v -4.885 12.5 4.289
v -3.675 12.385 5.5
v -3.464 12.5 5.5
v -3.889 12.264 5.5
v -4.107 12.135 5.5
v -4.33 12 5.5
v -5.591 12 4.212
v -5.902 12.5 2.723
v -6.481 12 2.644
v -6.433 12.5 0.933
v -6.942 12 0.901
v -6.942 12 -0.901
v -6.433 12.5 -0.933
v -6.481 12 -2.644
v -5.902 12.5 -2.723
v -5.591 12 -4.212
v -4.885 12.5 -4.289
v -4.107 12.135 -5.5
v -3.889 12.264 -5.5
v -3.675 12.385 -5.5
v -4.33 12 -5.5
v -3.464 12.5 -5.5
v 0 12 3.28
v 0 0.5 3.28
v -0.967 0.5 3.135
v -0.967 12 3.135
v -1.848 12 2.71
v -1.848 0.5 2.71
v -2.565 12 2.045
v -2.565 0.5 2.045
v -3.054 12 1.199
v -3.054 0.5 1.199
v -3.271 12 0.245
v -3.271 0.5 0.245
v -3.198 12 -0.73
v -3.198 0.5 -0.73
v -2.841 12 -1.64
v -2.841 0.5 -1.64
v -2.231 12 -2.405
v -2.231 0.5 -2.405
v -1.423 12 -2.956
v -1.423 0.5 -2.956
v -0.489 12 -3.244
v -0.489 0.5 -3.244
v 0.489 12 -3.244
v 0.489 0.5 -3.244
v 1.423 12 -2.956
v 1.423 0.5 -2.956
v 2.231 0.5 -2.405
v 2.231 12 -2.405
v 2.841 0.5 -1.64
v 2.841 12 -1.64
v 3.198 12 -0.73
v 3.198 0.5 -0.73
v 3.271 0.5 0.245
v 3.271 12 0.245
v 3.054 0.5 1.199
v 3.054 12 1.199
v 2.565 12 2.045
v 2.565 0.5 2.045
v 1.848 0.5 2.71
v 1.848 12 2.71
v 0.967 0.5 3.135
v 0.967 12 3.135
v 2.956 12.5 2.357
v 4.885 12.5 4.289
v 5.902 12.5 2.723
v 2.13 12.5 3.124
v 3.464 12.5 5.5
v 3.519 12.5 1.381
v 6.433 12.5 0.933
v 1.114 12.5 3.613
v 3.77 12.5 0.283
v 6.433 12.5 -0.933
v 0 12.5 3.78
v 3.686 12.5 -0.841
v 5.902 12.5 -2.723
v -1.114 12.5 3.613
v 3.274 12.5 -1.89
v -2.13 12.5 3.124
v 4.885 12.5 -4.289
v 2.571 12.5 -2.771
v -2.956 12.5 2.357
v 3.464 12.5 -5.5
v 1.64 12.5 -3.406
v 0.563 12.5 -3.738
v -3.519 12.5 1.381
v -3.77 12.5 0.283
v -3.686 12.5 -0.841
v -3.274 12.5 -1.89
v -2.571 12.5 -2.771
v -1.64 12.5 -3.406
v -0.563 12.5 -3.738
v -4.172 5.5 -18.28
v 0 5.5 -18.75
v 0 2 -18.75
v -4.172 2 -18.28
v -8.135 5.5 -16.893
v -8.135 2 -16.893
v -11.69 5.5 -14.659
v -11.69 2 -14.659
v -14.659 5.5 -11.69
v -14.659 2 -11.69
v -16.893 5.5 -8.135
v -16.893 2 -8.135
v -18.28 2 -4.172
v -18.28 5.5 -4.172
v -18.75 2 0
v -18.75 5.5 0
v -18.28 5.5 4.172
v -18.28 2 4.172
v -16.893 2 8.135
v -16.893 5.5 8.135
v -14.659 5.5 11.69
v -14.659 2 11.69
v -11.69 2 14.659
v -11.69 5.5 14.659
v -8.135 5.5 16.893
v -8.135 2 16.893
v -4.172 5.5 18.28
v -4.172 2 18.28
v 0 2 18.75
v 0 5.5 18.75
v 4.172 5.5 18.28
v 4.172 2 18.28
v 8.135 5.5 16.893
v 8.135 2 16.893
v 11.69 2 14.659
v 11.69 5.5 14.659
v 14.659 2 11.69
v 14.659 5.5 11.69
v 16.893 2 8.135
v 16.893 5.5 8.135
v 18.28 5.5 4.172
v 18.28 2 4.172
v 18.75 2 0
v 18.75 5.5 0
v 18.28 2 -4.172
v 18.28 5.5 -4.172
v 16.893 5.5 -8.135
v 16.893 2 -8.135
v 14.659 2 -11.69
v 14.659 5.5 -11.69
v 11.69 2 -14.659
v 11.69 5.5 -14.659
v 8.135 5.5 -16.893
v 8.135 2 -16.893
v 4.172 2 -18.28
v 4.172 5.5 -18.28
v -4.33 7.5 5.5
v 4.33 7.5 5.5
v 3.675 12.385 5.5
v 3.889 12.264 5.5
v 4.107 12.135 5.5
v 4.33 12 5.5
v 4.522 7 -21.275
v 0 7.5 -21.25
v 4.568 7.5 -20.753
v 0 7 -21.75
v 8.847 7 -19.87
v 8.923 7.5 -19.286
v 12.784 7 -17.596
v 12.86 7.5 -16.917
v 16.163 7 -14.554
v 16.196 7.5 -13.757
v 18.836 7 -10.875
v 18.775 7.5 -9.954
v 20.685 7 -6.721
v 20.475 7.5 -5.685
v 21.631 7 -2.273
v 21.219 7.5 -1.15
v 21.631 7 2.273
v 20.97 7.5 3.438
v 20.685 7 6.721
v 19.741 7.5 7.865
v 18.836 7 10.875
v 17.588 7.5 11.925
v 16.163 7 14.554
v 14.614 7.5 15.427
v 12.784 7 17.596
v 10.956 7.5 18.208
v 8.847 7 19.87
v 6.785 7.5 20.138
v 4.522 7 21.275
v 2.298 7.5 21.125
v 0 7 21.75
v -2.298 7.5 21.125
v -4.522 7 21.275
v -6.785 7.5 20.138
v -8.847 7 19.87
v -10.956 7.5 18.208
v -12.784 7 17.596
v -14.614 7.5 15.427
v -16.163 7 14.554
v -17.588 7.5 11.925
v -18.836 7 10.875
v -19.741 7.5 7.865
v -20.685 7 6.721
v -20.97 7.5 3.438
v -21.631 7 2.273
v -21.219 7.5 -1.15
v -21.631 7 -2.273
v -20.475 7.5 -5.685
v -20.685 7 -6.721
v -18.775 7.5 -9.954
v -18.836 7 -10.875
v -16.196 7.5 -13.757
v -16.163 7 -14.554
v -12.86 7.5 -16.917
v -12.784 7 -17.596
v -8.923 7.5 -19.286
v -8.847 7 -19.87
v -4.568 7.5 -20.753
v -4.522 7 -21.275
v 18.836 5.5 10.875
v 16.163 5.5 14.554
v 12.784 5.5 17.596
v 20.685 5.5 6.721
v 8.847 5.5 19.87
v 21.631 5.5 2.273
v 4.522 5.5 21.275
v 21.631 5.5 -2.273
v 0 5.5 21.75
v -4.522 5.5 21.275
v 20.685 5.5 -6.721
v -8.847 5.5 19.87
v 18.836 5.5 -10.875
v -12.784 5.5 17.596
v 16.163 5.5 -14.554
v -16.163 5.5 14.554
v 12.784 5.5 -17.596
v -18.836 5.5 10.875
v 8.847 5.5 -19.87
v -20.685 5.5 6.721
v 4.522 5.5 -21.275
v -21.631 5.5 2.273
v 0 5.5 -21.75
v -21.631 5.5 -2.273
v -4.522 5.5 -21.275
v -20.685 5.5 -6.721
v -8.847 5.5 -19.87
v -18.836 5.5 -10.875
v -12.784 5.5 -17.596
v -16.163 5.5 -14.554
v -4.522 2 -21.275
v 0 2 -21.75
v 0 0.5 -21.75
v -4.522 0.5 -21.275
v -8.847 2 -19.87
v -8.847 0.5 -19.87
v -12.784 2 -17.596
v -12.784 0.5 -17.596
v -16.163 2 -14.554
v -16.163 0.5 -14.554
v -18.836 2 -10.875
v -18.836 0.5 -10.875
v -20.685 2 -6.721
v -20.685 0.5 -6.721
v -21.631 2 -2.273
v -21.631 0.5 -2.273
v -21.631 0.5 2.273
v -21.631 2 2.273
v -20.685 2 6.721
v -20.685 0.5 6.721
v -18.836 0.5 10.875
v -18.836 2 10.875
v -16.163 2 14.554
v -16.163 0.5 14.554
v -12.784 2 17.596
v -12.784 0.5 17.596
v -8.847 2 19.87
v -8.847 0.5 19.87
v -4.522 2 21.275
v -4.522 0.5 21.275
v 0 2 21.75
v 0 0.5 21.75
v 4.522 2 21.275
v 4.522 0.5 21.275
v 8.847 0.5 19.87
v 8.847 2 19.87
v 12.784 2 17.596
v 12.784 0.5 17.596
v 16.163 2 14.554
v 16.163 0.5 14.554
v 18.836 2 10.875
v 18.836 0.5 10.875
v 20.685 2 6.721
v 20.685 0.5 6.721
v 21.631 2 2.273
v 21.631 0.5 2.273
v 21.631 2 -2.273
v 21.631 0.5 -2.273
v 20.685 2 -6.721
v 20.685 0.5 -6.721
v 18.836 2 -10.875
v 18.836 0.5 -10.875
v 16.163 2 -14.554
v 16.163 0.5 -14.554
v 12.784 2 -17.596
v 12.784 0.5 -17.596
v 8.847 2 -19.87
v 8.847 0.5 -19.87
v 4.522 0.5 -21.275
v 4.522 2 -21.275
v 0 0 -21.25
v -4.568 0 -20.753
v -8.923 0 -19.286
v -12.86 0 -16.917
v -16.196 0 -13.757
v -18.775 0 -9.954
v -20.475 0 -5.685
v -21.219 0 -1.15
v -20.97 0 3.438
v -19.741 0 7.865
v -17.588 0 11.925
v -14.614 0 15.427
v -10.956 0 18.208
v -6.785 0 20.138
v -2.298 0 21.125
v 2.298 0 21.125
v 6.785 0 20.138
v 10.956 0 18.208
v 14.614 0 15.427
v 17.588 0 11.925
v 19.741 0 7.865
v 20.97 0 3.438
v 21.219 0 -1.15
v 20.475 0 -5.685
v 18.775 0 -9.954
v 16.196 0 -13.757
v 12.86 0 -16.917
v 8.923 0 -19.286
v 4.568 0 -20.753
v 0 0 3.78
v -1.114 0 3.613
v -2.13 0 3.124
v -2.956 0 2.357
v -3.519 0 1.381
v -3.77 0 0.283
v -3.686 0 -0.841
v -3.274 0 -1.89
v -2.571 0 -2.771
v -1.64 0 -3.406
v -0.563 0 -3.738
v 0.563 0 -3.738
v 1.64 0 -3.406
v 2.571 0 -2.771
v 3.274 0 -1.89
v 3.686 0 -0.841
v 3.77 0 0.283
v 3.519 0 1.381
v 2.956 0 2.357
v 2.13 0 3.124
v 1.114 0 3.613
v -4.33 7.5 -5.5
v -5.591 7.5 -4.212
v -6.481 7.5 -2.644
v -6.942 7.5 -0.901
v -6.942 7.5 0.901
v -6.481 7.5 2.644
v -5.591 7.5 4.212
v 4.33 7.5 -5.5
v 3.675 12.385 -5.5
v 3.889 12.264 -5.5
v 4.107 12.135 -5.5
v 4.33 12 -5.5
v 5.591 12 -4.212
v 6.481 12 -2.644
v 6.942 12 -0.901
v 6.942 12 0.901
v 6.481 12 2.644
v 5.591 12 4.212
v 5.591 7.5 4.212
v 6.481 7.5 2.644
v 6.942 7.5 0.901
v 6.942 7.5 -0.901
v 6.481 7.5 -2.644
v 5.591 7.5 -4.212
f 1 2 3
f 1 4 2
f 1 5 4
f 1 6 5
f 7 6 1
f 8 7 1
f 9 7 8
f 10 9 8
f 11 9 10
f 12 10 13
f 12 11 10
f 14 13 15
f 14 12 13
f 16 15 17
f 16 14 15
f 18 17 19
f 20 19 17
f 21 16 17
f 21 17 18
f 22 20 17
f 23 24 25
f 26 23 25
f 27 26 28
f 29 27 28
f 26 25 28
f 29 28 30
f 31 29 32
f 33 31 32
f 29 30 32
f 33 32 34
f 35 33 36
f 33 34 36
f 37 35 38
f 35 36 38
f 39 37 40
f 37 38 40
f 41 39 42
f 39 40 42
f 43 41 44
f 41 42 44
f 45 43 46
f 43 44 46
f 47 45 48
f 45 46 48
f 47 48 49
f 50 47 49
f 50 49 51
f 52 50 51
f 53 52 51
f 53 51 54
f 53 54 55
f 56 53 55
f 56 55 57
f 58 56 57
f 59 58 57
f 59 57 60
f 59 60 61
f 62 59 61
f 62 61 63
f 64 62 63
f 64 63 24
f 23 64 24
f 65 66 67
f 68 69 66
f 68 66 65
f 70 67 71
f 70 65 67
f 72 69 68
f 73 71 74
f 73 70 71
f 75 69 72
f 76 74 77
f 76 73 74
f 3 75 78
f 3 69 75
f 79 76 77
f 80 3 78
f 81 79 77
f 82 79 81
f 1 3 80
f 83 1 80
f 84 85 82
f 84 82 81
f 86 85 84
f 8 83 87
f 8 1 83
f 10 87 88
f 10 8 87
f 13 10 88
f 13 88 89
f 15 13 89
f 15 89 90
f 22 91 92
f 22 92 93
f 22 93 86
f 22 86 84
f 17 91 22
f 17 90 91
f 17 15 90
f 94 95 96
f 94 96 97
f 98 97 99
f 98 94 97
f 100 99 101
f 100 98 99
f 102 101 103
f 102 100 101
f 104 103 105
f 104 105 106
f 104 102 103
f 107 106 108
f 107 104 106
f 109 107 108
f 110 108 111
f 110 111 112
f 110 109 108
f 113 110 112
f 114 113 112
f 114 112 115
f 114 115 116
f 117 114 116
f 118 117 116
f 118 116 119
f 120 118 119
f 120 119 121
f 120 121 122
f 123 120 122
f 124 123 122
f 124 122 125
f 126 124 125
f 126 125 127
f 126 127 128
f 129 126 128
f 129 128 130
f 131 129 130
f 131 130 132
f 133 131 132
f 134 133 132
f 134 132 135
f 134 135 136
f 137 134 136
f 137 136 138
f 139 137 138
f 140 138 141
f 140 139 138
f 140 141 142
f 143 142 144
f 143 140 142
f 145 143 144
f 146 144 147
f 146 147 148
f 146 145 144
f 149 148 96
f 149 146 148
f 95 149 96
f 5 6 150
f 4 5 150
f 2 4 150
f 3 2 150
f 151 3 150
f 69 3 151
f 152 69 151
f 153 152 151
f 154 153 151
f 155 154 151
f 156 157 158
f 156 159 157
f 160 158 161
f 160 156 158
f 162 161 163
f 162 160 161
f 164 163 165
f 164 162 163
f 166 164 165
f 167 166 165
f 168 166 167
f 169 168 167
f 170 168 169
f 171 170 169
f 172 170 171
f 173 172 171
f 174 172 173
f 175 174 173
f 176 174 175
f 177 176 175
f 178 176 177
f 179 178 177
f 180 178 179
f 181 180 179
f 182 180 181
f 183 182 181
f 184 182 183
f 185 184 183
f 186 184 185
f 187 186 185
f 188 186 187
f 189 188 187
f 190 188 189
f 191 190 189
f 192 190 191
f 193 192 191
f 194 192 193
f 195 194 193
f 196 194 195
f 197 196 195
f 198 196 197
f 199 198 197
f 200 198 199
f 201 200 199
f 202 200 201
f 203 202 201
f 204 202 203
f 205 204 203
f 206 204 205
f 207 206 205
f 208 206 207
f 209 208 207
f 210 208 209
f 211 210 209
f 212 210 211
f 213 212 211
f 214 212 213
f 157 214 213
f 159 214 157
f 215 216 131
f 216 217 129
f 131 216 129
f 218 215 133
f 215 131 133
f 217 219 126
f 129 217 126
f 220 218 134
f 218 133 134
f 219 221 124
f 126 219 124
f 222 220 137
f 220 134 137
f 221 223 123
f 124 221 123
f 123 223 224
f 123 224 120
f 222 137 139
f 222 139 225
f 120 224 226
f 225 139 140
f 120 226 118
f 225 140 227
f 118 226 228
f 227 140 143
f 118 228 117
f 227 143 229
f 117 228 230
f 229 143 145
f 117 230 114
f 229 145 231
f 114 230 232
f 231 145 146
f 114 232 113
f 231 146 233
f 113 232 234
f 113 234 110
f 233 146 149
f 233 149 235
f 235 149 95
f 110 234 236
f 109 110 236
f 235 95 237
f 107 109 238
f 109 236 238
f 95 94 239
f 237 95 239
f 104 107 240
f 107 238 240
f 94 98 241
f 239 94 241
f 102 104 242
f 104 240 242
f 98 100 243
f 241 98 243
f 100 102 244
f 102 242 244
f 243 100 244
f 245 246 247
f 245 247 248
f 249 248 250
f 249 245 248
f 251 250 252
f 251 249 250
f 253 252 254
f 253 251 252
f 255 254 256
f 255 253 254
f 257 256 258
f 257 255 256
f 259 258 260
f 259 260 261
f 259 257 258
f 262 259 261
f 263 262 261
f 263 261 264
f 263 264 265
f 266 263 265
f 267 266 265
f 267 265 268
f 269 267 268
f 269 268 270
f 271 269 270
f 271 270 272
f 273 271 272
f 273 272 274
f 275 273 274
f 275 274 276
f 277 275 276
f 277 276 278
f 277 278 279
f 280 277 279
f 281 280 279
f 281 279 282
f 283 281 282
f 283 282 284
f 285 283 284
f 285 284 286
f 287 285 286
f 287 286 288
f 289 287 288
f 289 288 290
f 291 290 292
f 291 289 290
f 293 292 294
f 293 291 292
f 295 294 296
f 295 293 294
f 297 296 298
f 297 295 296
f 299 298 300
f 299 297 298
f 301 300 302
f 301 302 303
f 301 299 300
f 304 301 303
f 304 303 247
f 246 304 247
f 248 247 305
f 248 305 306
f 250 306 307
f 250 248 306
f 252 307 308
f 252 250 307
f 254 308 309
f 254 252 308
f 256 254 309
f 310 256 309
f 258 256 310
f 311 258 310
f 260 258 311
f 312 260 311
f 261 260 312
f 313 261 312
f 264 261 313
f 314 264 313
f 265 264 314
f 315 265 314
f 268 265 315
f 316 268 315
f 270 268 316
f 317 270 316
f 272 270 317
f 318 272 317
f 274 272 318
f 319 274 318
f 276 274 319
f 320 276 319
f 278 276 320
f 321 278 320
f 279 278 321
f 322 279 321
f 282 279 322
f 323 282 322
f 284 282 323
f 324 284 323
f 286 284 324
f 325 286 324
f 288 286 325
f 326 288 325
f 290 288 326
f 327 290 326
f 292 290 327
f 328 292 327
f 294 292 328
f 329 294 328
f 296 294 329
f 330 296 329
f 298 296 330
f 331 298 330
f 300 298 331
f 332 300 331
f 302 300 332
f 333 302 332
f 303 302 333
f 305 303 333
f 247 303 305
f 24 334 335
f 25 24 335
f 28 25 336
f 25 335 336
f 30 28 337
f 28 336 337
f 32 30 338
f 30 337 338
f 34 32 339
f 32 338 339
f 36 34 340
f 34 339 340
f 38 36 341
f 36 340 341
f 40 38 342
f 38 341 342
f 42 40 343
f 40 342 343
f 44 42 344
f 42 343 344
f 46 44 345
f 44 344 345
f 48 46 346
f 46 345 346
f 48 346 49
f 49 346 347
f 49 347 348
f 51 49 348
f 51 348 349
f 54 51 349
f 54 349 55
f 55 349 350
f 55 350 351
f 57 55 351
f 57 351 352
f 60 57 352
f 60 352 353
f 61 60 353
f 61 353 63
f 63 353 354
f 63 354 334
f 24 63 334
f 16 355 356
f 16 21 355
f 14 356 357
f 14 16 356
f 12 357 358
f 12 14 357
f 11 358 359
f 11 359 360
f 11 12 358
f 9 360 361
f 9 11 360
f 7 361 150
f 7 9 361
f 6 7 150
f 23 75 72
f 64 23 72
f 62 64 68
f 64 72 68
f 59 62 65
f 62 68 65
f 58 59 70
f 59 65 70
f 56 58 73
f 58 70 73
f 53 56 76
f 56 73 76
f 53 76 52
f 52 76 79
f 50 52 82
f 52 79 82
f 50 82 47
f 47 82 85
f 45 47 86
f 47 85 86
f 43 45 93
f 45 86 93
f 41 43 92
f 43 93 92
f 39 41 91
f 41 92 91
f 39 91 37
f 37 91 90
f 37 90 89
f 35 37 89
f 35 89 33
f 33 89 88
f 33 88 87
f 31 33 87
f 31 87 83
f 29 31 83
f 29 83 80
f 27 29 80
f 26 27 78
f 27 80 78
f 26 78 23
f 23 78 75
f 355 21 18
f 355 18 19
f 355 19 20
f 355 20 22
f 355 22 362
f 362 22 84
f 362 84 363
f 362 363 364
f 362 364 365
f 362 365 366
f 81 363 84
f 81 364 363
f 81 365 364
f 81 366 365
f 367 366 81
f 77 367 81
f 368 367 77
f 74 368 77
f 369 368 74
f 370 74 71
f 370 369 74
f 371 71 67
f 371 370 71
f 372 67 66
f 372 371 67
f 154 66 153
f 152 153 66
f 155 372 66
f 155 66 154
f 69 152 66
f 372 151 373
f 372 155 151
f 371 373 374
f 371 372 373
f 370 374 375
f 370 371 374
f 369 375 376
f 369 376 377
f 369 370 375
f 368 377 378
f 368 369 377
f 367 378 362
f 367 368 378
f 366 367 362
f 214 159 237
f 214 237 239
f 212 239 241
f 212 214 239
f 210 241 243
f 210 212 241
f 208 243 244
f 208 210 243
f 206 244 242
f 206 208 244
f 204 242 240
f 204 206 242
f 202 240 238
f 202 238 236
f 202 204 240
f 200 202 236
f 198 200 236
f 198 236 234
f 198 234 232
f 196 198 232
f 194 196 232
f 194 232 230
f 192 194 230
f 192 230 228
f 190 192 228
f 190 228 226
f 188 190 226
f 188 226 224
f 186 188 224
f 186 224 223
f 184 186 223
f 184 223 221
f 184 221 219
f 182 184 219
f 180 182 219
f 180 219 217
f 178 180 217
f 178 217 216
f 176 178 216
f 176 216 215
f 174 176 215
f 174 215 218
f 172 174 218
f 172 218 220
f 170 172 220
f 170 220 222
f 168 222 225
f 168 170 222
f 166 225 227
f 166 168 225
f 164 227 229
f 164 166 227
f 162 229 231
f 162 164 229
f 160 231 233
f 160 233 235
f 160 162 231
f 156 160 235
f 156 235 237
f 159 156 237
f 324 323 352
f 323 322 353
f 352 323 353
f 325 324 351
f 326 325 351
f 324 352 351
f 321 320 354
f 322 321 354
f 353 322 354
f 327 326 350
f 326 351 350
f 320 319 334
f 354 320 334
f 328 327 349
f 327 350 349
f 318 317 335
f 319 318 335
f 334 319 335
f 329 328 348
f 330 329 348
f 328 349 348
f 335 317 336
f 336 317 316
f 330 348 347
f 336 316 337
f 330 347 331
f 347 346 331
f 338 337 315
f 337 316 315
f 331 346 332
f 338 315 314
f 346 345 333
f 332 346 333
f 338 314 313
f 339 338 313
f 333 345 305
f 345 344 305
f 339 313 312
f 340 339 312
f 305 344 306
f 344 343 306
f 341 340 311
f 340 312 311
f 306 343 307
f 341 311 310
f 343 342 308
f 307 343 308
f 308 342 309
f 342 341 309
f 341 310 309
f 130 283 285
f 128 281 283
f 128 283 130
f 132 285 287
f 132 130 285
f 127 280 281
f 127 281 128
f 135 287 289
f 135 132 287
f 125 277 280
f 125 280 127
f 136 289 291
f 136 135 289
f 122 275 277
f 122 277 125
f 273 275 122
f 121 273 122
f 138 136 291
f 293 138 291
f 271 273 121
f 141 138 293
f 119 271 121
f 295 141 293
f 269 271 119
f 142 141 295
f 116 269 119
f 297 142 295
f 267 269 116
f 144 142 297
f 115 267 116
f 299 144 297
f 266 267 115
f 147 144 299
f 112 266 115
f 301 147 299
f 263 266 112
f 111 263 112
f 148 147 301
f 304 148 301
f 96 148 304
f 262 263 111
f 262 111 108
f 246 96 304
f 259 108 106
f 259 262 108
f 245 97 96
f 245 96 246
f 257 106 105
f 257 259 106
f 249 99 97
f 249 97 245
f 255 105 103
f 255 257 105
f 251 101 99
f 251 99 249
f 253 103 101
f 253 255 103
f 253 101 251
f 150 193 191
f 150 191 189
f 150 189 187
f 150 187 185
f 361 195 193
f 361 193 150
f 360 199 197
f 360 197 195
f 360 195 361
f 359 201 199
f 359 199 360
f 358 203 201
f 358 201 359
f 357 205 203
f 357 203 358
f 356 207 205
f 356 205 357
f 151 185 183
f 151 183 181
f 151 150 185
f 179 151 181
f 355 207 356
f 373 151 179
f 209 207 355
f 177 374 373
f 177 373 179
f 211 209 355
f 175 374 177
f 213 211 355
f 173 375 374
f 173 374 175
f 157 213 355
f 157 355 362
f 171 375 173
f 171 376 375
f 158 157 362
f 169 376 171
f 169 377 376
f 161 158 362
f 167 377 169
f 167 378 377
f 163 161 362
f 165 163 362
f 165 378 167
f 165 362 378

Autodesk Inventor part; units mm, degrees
ref_plane "YZ Plane" through (0, 0, 0) normal (1, 0, 0) x (0, 1, 0)
ref_plane "XZ Plane" through (0, 0, 0) normal (0, 1, 0) x (-1, 0, 0)
ref_plane "XY Plane" through (0, 0, 0) normal (0, 0, 1) x (1, 0, 0)
sketch "Sketch6" plane through (0, 0, 0) normal (1, 0, 0) x (0, 1, 0)
  line L0 (0, 0) -> (12.5, 0)
  line L1 (0, 0) -> (0, -21.75)
  line L2 (0, -21.75) -> (2, -21.75)
  line L3 (2, -21.75) -> (2, -18.75)
  line L4 (2, -18.75) -> (5.5, -18.75)
  line L5 (5.5, -18.75) -> (5.5, -21.75)
  line L6 (5.5, -21.75) -> (7.5, -21.75)
  line L7 (7.5, -21.75) -> (7.5, -7)
  line L8 (7.5, -7) -> (12.5, -7)
  line L9 (12.5, -7) -> (12.5, 0)
  point P0 (6.25, 0)
  dimension "d28" = 43.5
  dimension "d29" = 14
  dimension "d30" = 5
  dimension "d31" = 7
  dimension "d33" = 3.5
  dimension "d35" = 12.5
  dimension "d36" = 37.5
revolve "Revolution3" add sketch "Sketch6" angle 360 about axis through (0, 0, 0) along (0, 1, 0)
hole "Hole2" at (0, 12.5, 0) direction (0, -1, 0) diameter 6.561 end through all thread size "G 1/16-28" standard "BSP Pipe Threads"
sketch "Sketch7" plane through (0, 12.5, 0) normal (0, 1, 0) x (1, 0, 0)
  circle A0 centre (0, 0) radius 7 construction
  line L0 (-4.3301, -5.5) -> (4.3301, -5.5)
  line L1 (7, 0) -> (-7, 0)
  line L2 (-4.3301, 5.5) -> (4.3301, 5.5)
  arc A1 (-4.3301, -5.5) -> (4.3301, -5.5) centre (0, 0) ccw
  arc A2 (4.3301, 5.5) -> (-4.3301, 5.5) centre (0, 0) ccw
  dimension "d49" = 11
extrude "Extrusion2" cut sketch "Sketch7" against normal up to surface (5 mm away)
chamfer "Chamfer5" distance 0.5 angle 45 6 edges at (0, 0, 21.75) (0, 7.5, 21.75) (7, 12.5, 0) (-7, 12.5, 0) (0, 0, -3.2805) (0, 12.5, -3.2805)
properties part number "Endcap" material "Steel"
